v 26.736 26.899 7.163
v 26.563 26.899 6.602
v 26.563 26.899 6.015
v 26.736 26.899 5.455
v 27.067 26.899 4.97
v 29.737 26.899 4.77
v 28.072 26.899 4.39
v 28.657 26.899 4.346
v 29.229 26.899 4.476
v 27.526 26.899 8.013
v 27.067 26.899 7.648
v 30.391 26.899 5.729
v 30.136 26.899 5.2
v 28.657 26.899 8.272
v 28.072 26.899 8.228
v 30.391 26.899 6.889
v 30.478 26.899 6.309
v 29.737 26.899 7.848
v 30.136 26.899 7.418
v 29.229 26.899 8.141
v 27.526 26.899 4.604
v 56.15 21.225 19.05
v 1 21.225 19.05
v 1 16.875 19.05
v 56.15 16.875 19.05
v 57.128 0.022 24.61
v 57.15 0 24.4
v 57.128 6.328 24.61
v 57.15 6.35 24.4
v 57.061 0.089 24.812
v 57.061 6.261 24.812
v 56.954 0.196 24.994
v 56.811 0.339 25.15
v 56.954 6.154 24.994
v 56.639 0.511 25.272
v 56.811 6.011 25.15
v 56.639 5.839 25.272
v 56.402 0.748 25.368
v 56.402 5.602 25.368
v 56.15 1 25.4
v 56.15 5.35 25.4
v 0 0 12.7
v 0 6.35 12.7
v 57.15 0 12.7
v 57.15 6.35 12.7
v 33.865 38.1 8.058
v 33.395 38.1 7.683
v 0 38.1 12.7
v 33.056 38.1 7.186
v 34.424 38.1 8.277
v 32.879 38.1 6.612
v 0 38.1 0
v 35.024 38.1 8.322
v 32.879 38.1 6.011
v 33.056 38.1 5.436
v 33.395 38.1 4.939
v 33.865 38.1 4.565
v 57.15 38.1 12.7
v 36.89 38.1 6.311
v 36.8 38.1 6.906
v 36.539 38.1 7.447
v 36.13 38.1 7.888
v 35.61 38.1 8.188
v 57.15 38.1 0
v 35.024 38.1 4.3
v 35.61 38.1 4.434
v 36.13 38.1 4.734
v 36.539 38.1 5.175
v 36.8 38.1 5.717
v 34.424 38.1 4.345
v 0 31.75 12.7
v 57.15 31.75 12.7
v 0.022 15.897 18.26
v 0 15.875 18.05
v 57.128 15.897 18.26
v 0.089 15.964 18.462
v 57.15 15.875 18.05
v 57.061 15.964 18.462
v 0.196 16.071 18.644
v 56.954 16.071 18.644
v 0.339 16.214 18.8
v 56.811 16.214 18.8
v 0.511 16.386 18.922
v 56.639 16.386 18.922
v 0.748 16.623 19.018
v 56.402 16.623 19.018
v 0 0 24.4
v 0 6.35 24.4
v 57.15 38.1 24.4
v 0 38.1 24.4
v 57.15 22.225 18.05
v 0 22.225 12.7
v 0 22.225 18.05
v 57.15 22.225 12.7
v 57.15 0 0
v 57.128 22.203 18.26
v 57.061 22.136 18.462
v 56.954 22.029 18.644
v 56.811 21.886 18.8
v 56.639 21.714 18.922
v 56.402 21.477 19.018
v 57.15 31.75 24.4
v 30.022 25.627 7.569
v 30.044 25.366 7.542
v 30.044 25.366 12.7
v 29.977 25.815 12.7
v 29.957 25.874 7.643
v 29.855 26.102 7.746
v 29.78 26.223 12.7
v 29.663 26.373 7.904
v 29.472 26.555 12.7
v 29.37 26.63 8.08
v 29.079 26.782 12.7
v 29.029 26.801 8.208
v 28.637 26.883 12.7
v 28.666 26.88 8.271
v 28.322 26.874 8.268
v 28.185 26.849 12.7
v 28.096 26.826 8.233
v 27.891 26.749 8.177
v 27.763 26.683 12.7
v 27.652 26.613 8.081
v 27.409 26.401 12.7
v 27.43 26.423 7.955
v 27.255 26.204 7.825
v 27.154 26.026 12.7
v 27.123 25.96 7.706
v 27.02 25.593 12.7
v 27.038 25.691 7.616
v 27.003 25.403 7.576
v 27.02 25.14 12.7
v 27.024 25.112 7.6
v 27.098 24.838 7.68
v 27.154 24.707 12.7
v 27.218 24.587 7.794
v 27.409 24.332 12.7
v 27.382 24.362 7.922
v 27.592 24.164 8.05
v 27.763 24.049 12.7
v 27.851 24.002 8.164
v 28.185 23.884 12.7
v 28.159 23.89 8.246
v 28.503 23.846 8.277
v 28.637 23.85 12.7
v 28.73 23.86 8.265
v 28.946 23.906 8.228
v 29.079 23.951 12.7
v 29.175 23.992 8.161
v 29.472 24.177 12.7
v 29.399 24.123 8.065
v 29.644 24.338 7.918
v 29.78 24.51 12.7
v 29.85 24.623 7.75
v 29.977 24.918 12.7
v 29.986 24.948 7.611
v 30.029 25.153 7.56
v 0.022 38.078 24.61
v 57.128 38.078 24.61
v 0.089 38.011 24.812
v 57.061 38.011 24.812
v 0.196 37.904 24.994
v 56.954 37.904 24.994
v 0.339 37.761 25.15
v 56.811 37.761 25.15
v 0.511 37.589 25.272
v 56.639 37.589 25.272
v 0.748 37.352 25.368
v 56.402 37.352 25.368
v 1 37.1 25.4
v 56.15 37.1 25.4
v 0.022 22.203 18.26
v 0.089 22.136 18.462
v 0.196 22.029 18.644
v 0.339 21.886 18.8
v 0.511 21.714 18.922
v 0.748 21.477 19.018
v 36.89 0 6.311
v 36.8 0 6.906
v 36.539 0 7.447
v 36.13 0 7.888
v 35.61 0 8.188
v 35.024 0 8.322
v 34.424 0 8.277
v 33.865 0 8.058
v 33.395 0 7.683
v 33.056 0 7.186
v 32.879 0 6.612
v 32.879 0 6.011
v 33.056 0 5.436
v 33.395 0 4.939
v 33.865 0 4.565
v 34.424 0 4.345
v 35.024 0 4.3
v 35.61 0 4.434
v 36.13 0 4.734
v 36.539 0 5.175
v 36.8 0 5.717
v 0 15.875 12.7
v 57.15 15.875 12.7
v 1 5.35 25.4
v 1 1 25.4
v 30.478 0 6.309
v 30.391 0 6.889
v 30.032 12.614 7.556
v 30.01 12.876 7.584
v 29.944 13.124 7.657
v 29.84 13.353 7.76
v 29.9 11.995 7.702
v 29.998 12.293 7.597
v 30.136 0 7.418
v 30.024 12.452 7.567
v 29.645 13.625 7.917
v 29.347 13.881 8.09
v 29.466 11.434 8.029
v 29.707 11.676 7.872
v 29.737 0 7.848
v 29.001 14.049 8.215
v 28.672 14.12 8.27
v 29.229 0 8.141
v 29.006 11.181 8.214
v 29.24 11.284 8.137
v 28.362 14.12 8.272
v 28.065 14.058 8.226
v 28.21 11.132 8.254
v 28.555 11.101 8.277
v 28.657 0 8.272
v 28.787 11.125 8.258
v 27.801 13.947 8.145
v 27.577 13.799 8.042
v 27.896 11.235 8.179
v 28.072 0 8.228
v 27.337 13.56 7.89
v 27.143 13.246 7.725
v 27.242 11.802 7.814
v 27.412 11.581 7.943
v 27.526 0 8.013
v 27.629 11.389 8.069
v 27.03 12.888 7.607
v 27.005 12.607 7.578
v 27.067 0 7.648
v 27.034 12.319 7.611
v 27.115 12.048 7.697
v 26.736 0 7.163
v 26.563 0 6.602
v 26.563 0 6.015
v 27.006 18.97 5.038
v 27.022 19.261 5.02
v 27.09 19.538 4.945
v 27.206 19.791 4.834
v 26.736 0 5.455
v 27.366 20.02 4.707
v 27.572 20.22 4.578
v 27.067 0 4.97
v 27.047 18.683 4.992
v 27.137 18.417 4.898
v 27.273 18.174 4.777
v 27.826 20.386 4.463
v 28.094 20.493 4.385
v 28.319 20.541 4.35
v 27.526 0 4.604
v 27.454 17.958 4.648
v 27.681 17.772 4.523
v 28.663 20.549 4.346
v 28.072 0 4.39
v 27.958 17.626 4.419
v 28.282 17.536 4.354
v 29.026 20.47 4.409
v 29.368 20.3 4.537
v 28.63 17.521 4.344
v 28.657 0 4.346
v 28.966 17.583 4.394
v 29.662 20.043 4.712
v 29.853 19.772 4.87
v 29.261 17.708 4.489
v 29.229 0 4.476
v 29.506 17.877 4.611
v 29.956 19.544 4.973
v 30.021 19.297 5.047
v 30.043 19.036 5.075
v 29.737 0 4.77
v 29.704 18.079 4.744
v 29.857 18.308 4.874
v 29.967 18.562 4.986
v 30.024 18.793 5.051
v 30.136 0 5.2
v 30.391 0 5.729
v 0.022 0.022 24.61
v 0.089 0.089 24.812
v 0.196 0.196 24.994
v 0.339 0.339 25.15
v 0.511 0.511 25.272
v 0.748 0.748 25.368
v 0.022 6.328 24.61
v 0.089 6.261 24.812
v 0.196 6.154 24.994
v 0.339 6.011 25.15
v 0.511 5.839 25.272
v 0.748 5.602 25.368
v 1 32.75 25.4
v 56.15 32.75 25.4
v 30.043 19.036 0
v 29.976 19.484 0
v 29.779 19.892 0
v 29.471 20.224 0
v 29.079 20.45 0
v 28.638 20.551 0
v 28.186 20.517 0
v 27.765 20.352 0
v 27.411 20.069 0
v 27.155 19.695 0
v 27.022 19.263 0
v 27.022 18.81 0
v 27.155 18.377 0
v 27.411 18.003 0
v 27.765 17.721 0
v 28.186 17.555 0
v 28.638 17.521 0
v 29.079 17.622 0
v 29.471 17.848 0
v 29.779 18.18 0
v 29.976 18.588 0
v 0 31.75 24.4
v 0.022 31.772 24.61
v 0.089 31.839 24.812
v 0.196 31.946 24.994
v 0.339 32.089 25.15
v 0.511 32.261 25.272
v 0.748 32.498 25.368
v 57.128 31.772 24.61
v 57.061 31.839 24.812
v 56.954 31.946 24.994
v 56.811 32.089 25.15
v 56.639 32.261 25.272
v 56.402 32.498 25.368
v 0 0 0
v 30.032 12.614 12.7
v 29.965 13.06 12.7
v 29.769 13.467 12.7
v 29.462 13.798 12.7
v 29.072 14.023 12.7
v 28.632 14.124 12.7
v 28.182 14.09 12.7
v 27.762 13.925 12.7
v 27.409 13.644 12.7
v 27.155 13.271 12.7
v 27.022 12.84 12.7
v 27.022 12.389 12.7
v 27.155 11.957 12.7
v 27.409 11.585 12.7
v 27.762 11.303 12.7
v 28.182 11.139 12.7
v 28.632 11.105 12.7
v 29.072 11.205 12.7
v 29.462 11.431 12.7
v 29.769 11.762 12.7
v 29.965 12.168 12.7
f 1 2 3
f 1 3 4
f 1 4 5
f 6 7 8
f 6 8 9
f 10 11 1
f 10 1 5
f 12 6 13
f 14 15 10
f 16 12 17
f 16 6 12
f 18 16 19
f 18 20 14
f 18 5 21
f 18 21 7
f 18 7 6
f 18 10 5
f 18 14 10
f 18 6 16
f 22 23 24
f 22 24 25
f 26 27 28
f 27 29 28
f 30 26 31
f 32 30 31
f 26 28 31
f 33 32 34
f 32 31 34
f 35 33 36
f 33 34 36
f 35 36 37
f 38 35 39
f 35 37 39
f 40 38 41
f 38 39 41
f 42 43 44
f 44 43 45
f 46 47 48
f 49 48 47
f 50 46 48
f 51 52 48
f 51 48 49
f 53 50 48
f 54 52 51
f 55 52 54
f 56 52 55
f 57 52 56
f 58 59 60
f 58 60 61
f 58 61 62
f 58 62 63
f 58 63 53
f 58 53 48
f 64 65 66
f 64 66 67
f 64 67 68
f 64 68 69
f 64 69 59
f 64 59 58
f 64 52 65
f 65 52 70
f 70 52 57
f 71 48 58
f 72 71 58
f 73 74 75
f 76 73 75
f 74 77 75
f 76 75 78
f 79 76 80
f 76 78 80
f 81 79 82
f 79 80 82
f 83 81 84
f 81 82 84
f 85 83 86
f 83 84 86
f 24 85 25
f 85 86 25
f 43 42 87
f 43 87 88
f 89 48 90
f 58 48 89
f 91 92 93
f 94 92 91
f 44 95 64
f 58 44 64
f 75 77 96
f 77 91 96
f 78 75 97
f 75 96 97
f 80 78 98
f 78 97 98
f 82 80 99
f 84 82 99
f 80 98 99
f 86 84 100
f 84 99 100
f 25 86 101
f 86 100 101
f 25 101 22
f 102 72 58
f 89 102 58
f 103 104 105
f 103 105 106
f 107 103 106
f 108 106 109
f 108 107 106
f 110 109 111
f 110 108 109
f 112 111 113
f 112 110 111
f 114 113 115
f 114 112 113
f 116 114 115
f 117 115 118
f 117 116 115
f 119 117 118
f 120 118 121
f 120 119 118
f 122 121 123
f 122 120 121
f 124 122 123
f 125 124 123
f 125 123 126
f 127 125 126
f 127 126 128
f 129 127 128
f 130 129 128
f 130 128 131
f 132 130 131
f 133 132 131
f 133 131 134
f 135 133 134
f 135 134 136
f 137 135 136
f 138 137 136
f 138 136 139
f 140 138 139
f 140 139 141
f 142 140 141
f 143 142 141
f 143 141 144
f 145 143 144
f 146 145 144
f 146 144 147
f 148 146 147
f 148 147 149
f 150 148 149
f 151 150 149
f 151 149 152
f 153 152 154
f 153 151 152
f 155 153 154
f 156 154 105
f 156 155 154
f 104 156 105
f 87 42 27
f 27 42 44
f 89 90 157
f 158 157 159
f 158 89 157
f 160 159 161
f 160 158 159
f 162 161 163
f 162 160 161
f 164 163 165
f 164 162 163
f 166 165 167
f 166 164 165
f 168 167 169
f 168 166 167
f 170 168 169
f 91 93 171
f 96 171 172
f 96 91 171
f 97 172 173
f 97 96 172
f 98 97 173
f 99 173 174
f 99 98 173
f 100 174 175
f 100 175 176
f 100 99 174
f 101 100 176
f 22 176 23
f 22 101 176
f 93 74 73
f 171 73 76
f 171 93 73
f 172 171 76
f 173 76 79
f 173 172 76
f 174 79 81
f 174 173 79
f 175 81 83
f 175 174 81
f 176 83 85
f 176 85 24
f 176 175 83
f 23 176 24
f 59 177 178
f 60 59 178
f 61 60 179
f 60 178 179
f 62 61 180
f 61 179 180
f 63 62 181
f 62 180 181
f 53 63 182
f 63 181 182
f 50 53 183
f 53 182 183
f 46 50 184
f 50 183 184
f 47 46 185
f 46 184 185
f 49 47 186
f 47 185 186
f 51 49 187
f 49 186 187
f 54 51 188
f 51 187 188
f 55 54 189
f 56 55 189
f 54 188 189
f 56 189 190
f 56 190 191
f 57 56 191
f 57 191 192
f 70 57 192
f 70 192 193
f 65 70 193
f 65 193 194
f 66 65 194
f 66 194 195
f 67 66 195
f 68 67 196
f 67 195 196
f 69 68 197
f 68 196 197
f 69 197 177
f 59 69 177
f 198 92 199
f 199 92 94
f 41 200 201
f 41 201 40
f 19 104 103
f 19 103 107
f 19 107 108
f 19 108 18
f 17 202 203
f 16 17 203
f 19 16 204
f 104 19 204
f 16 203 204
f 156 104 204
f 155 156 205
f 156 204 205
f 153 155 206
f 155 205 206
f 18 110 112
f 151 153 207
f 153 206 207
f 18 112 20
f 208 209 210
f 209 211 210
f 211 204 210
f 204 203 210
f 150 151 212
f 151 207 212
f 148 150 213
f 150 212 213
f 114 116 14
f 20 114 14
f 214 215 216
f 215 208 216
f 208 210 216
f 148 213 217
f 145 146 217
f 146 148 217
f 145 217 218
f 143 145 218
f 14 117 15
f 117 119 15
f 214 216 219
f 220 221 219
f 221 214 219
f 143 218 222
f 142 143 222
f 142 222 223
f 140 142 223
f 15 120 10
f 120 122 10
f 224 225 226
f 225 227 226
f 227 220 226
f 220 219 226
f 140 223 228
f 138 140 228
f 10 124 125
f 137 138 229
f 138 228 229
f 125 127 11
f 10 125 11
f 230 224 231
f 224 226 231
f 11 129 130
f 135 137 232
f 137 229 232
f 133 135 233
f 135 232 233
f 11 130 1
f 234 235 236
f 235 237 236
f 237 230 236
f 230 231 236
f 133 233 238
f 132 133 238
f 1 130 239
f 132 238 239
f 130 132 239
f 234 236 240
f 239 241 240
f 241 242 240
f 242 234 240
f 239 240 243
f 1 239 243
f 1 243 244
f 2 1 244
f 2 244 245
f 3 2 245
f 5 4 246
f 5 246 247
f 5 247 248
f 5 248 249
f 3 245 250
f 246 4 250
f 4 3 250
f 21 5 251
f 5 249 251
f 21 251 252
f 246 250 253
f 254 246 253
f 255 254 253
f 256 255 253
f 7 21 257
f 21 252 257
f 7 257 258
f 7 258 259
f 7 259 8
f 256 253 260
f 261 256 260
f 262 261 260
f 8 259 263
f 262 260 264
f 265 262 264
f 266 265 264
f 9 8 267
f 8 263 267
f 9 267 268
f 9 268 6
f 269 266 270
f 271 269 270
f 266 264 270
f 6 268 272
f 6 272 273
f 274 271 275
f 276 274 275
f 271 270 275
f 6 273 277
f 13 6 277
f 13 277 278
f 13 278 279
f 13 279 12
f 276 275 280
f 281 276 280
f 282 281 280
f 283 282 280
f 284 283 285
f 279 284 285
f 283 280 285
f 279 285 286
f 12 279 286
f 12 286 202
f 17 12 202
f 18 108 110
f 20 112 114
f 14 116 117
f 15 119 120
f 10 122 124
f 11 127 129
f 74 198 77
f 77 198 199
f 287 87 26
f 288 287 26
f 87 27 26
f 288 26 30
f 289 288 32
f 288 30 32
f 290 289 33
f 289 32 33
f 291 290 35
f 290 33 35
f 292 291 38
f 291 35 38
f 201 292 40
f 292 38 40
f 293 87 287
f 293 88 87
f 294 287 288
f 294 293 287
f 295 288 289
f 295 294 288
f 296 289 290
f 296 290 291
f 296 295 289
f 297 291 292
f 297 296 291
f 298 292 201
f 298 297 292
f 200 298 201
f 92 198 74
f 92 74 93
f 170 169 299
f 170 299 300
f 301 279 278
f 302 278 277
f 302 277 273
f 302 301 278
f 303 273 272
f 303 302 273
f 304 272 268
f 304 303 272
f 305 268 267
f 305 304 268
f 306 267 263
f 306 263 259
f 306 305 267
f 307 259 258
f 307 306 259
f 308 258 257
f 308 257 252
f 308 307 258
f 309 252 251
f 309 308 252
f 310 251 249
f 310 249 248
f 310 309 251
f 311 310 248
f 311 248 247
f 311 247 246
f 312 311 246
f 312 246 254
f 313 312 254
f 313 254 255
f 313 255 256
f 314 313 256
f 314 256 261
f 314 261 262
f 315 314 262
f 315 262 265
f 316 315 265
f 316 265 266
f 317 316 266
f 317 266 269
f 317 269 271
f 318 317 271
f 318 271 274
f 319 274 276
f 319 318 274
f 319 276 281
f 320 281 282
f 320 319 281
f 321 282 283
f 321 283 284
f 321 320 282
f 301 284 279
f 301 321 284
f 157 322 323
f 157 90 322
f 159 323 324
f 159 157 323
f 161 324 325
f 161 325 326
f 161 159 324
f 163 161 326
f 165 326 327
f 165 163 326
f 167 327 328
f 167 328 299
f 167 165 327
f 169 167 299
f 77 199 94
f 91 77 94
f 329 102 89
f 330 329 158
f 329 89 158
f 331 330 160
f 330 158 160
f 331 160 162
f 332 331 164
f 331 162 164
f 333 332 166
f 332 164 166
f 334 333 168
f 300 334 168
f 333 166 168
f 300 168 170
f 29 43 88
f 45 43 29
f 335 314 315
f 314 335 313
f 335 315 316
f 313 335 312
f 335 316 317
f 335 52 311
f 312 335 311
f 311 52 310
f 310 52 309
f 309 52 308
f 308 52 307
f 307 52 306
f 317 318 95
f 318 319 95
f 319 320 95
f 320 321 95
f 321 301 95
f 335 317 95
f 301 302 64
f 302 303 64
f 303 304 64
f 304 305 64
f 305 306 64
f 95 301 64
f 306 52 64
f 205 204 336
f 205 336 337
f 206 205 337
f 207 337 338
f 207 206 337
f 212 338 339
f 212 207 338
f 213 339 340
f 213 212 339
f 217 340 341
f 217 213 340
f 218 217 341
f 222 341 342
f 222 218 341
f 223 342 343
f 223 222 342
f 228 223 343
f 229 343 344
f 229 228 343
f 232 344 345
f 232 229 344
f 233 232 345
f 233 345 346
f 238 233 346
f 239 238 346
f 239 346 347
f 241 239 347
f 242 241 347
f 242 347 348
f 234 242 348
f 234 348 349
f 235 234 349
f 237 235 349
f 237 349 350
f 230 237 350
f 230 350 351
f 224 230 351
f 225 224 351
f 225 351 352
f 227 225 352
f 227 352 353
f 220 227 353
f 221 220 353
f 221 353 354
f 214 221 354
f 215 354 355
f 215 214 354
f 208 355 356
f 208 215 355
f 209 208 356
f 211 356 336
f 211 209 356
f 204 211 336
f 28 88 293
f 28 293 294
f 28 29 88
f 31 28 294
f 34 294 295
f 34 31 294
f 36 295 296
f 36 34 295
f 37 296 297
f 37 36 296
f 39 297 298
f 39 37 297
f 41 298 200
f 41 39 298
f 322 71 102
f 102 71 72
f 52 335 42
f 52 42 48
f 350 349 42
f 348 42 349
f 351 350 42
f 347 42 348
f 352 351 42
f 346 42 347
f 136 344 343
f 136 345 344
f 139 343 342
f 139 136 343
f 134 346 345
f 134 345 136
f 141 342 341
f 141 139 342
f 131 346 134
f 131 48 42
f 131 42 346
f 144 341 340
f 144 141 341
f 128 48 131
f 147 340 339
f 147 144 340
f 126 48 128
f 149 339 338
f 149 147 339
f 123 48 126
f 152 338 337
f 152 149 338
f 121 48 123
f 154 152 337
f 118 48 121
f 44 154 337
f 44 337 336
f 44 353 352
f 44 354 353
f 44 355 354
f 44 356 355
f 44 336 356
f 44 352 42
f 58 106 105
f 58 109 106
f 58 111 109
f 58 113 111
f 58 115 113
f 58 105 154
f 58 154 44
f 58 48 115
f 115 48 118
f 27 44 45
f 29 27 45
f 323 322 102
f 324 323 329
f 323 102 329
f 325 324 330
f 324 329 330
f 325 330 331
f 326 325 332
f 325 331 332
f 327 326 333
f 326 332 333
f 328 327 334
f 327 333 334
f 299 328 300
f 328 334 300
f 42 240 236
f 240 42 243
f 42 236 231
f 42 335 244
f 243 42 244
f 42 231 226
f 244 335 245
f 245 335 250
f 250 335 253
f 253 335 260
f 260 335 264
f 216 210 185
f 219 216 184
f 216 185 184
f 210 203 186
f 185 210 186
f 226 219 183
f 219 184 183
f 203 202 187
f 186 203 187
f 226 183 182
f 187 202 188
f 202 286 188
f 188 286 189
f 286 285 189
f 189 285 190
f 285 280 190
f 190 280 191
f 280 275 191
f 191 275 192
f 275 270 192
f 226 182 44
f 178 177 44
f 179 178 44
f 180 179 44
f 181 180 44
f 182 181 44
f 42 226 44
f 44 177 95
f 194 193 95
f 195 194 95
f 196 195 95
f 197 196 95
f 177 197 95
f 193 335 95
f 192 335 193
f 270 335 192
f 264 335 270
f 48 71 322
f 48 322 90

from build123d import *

# Parameters (mm, degrees)
BOX001_W     = 57.15
BOX001_H     = 6.35
BOX001_DEPTH = 12.7
FILLET_R     = 1
BOX002_W     = 57.15
BOX002_H     = 6.35
BOX002_DEPTH = 12.7
FILLET001_R  = 1
BOX003_W     = 57.15
BOX003_H     = 6.35
BOX003_DEPTH = 6.35
FILLET002_R  = 1
SKETCH002_R  = 1.968415
PAD001_DEPTH = 26.8986
SKETCH003_R  = 1.513596
PAD002_DEPTH = 6.35
SKETCH001_R  = 1.519201
PAD_DEPTH    = 6.35
SKETCH004_R  = 1.520745
PAD003_DEPTH = 6.35
SKETCH005_R  = 2.01665
PAD004_DEPTH = 38.1
BOX_W        = 57.15
BOX_H        = 38.1
BOX_DEPTH    = 12.7


with BuildPart() as fillet_body:
    # Box001 → Box001 (new body)
    with BuildSketch(Plane.XY.offset(12.7)):
        with Locations((28.575, 3.175)):
            Rectangle(BOX001_W, BOX001_H)
    extrude(amount=BOX001_DEPTH)

    # Fillet
    fillet_edges = [fillet_body.edges().sort_by_distance(p)[0] for p in [
        (0, 3.175, 25.4),
        (57.15, 3.175, 25.4),
        (28.575, 0, 25.4),
        (28.575, 6.35, 25.4),
    ]]
    fillet(fillet_edges, radius=FILLET_R)


with BuildPart() as fillet001:
    # Box002 → Box002 (new body)
    with BuildSketch(Plane(origin=(0, 31.75, 12.7), x_dir=(1, 0, 0), z_dir=(0, 0, 1))):
        with Locations((28.575, 3.175)):
            Rectangle(BOX002_W, BOX002_H)
    extrude(amount=BOX002_DEPTH)

    # Fillet001
    fillet001_edges = [fillet001.edges().sort_by_distance(p)[0] for p in [
        (0, 34.925, 25.4),
        (57.15, 34.925, 25.4),
        (28.575, 31.75, 25.4),
        (28.575, 38.1, 25.4),
    ]]
    fillet(fillet001_edges, radius=FILLET001_R)


with BuildPart() as fillet002:
    # Box003 → Box003 (new body)
    with BuildSketch(Plane(origin=(0, 15.875, 12.7), x_dir=(1, 0, 0), z_dir=(0, 0, 1))):
        with Locations((28.575, 3.175)):
            Rectangle(BOX003_W, BOX003_H)
    extrude(amount=BOX003_DEPTH)

    # Fillet002
    fillet002_edges = [fillet002.edges().sort_by_distance(p)[0] for p in [
        (0, 19.05, 19.05),
        (57.15, 19.05, 19.05),
        (28.575, 15.875, 19.05),
        (28.575, 22.225, 19.05),
    ]]
    fillet(fillet002_edges, radius=FILLET002_R)


with BuildPart() as pad001:
    # Sketch002 → Pad001 (new body)
    with BuildSketch(Plane.XZ):
        with Locations((28.509926, 6.30875)):
            Circle(SKETCH002_R)
    extrude(amount=-PAD001_DEPTH)


with BuildPart() as pad002:
    # Sketch003 → Pad002 (new body)
    with BuildSketch(Plane.XY.offset(6.35)):
        with Locations((28.518757, 12.614189)):
            Circle(SKETCH003_R)
    extrude(amount=PAD002_DEPTH)


with BuildPart() as pad:
    # Sketch001 → Pad (new body)
    with BuildSketch(Plane.XY):
        with Locations((28.524174, 19.036169)):
            Circle(SKETCH001_R)
    extrude(amount=PAD_DEPTH)


with BuildPart() as pad003:
    # Sketch004 → Pad003 (new body)
    with BuildSketch(Plane.XY.offset(6.35)):
        with Locations((28.523685, 25.366407)):
            Circle(SKETCH004_R)
    extrude(amount=PAD003_DEPTH)


with BuildPart() as fusion002:
    # Fusion002 base: copy of Pad003
    add(pad003.part)

    # Fusion002: union Pad001, Pad002, Pad
    add(pad001.part)
    add(pad002.part)
    add(pad.part)


with BuildPart() as pad004:
    # Sketch005 → Pad004 (new body)
    with BuildSketch(Plane.XZ):
        with Locations((34.873043, 6.31109)):
            Circle(SKETCH005_R)
    extrude(amount=-PAD004_DEPTH)


with BuildPart() as fusion:
    # Fusion base: copy of Pad002
    add(pad002.part)

    # Fusion: union Pad001, Pad003
    add(pad001.part)
    add(pad003.part)


with BuildPart() as fusion001:
    # Fusion001 base: copy of Pad
    add(pad.part)

    # Fusion001: union Fusion
    add(fusion.part)


with BuildPart() as cut003:
    # Box → Box (new body)
    with BuildSketch(Plane.XY):
        with Locations((28.575, 19.05)):
            Rectangle(BOX_W, BOX_H)
    extrude(amount=BOX_DEPTH)

    # Cut: cut Pad
    add(pad.part, mode=Mode.SUBTRACT)

    # Cut001: cut Fusion001
    add(fusion001.part, mode=Mode.SUBTRACT)

    # Cut002: cut Pad004
    add(pad004.part, mode=Mode.SUBTRACT)

    # Cut003: cut Fusion002
    add(fusion002.part, mode=Mode.SUBTRACT)


solid = Compound([fillet_body.part, fillet001.part, fillet002.part, cut003.part])
